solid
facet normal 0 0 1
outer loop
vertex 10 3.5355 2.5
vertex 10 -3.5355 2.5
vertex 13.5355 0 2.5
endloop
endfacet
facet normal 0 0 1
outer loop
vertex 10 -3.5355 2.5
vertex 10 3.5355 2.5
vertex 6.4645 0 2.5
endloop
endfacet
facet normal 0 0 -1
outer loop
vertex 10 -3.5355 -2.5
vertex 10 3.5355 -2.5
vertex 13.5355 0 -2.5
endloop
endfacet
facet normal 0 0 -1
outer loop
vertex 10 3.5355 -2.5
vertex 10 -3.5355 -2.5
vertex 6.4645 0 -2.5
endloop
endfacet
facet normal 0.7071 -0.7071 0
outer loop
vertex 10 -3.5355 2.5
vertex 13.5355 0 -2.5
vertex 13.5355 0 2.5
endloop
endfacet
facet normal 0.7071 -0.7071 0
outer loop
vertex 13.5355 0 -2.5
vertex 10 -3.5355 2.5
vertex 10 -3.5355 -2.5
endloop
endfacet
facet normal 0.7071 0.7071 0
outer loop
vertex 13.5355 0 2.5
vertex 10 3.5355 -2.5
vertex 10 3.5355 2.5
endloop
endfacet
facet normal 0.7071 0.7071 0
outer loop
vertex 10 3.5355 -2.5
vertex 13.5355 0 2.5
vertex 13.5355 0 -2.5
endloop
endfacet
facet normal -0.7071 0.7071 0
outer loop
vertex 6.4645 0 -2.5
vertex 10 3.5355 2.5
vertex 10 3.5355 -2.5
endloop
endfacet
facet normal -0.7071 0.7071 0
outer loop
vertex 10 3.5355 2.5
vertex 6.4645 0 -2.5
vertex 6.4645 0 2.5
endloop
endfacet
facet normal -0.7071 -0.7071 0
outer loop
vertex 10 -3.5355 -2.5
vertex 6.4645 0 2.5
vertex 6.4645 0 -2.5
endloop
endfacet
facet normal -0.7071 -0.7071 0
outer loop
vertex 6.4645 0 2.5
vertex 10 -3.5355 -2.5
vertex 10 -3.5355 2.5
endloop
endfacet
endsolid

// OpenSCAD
translate([10.0, 0.0, 0.0]) {
    rotate(45.0, [0.0, 0.0, 1.0]) {
    cube([5.0, 5.0, 5.0], center=true);
}
}
